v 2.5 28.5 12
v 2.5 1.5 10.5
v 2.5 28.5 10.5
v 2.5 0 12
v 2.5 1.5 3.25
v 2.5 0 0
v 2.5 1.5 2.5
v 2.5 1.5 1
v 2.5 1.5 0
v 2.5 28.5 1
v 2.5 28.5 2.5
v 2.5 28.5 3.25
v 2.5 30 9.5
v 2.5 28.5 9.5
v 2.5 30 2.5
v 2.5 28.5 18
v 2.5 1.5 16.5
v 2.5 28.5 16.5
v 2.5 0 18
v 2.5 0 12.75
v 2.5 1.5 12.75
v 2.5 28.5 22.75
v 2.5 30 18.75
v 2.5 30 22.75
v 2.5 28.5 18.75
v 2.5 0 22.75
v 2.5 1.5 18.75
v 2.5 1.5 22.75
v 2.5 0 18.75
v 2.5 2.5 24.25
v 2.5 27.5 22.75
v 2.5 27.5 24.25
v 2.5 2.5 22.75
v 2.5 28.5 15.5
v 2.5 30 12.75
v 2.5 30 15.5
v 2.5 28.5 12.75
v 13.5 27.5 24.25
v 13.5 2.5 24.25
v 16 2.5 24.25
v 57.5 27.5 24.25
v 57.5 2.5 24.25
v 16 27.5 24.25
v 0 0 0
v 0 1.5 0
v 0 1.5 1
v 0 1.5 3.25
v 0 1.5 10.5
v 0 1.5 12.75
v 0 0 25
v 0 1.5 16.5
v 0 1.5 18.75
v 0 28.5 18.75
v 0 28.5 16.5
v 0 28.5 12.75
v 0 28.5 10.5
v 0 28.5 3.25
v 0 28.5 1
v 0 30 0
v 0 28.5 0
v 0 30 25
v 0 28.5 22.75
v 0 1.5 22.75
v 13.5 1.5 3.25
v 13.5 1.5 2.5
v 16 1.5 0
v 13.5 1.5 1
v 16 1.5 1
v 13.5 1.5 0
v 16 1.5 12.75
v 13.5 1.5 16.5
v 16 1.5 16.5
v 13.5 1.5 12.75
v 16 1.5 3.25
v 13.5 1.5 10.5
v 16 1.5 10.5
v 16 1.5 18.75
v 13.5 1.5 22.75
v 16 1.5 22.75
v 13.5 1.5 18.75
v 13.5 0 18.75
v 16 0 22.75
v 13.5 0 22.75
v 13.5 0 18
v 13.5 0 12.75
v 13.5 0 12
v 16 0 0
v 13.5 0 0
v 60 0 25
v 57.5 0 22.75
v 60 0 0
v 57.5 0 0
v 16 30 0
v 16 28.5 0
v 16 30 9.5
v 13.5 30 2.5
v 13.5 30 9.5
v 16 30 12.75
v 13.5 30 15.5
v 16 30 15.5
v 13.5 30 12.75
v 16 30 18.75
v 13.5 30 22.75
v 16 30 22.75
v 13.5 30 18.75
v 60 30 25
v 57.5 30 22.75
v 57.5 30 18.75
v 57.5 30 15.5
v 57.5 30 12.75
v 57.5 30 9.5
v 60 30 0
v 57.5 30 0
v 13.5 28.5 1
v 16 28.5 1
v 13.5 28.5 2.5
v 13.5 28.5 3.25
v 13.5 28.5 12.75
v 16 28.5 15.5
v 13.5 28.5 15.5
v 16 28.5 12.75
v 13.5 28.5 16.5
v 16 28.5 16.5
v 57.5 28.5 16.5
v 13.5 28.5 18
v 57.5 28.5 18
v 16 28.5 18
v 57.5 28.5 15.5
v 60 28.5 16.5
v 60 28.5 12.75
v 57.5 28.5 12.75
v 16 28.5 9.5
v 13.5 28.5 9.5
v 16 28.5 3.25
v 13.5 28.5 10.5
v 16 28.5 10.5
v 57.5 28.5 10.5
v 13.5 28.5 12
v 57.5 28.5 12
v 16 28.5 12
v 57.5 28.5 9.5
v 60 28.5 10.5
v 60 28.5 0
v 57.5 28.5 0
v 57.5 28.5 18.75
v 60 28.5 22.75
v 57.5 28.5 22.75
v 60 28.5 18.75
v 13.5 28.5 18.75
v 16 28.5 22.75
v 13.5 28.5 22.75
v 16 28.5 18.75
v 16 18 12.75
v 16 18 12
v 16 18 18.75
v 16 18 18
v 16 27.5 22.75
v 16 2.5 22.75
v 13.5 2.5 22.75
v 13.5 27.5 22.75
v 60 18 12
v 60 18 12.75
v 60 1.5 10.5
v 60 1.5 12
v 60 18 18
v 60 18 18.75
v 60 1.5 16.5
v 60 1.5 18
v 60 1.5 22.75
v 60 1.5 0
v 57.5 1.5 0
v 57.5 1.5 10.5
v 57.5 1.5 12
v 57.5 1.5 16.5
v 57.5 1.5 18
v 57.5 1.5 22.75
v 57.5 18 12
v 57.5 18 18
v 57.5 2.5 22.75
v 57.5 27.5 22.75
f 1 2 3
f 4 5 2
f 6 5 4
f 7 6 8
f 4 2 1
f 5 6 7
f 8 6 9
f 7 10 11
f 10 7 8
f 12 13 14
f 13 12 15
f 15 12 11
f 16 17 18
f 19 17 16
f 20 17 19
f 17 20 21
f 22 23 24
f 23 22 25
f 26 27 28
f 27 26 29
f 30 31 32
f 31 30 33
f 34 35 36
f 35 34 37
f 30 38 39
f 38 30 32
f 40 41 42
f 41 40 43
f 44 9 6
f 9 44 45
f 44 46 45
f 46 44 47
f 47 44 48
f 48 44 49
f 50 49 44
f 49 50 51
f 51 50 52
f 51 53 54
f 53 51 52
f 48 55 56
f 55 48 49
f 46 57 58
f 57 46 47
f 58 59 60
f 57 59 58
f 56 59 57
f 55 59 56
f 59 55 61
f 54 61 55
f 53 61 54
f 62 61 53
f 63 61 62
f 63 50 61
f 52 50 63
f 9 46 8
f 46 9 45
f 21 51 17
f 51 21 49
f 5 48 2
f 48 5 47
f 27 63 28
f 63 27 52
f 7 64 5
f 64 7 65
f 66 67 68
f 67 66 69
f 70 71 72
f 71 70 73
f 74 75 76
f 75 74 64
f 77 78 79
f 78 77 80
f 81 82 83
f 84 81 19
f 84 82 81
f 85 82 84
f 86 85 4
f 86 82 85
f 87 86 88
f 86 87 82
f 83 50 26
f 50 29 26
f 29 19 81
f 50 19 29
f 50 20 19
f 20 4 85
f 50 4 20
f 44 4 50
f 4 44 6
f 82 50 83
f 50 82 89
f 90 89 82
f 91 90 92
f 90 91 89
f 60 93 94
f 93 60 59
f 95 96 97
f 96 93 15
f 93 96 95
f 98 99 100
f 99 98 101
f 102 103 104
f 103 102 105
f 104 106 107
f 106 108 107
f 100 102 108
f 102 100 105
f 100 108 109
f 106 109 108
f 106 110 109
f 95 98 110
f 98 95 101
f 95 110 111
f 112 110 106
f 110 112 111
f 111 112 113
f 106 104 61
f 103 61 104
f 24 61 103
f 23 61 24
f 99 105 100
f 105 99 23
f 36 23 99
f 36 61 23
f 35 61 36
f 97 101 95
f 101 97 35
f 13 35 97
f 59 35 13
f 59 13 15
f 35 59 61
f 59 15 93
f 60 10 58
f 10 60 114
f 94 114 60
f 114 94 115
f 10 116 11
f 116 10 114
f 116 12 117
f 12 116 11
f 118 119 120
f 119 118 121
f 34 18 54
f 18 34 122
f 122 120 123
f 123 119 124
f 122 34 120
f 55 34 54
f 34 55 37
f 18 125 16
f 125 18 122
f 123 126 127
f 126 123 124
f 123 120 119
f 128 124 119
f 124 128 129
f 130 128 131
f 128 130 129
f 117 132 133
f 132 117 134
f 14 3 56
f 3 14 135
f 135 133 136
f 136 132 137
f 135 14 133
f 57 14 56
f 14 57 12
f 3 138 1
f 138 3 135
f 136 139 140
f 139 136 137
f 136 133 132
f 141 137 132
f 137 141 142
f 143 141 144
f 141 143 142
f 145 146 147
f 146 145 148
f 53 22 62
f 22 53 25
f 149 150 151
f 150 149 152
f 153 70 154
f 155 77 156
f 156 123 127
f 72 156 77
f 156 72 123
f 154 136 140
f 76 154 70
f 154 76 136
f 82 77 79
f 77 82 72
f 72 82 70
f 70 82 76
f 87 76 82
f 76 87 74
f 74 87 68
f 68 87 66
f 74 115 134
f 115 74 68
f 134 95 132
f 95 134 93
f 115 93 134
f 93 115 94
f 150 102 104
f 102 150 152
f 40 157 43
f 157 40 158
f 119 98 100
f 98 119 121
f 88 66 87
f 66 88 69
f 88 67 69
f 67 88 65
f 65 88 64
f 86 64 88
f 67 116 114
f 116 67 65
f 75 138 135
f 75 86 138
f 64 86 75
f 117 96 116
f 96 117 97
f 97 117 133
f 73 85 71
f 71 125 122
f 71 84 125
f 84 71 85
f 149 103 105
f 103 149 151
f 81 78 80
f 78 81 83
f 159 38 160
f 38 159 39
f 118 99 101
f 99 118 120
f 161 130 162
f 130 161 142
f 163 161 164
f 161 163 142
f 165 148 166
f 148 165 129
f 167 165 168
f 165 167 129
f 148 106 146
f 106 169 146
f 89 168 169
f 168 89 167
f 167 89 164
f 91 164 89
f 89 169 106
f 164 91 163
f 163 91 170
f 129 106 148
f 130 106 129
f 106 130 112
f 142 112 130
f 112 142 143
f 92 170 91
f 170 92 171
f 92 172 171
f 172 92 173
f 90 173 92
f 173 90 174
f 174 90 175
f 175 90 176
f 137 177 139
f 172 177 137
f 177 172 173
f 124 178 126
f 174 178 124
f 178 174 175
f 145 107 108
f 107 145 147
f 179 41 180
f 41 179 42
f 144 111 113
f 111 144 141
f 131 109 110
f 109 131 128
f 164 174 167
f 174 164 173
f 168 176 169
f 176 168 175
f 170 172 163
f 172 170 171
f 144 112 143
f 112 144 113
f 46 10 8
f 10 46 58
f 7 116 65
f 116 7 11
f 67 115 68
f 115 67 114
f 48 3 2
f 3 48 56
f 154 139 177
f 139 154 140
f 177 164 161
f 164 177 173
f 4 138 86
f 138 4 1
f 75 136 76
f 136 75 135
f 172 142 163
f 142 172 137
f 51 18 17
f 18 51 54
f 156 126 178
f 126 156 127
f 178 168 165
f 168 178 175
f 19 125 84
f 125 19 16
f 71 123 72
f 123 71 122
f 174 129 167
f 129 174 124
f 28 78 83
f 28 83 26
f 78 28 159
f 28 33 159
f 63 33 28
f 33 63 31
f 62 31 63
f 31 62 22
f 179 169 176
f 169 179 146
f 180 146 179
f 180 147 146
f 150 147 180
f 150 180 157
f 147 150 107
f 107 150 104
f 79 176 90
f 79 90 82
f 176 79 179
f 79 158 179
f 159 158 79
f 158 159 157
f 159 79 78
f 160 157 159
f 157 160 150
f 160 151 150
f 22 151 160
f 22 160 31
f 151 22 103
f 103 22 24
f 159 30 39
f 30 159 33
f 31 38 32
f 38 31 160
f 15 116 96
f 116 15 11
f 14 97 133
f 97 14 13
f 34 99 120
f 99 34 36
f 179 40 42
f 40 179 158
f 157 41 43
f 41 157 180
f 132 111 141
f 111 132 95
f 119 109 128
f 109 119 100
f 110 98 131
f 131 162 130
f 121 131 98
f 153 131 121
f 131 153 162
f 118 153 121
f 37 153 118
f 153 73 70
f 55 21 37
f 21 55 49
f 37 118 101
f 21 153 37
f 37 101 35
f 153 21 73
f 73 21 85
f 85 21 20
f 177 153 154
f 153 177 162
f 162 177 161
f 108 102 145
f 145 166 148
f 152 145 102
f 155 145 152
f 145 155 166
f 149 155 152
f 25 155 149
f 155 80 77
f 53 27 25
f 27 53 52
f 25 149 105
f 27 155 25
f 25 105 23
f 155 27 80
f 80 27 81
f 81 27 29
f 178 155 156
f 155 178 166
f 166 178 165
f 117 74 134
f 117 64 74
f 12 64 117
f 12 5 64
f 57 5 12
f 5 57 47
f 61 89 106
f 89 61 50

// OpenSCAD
// -*- mode: scad; orgstruct-heading-prefix-regexp: "// " -*-
// * Variables
table = [60, 30, 25];
stud = [2.5,1.5];
plywood_thickness = .75;
shelf = [11+stud.x, 12, [max(stud.y, stud.x), 12, 18]];
turquoise = [5/16,14/16,14/16];
blonde = [15.1/16, 13.25/16, 9.25/16];
mustard = [15.1/16, 13/16, 3/16];
module make_stud(length) { echo(length);cube([stud.x, stud.y, length]); }
module platform(x, y) { color(blonde) cube([x, y, plywood_thickness]); }

color(turquoise)
// * The 6 legs
for (x = [0, shelf.x, table.x - stud.x]) {
     for (y = [0, table.y - stud.y]) {
          translate([x,y,0])
               make_stud(table.z - plywood_thickness);
     }
}

color(turquoise)
// * Cross ties between the legs
for (z = concat(shelf.z, table.z - plywood_thickness)) {
     for (x = [0, shelf.x, table.x - stud.x]) {
          if (x != table.x - stud.x || z != shelf.z[0])
              translate([x, stud.y, z])
                  rotate([-90, 0, 0])
                  make_stud(table.y - stud.y * 2);
     }
}

//color(turquoise)
// * Cross ties spanning the legs
for (i = [0,1]) {
     x = [stud.x, shelf.x+stud.x][i];
     l = [shelf.x - stud.x, table.x - shelf.x - stud.x*2][i];

     for (y = [0, table.y - stud.x]) {
         translate([x,y, table.z - plywood_thickness - stud.y])
             rotate([90,0,90])
             make_stud(l);
     }

     // Back studs
     for (z = shelf.z) {
          if (i != 1 || z != shelf.z[0])
              translate([x,table.y - stud.y,z])
                  rotate([0,90,0])
                  make_stud(l);
     }
}

// * Tabletop
translate([0,0,table.z - plywood_thickness])
platform(table.x, table.y);

// * module shelf
module shelf(z) {
     translate([0,0,z]) {
          //shelf
          translate([0,stud.y,0])
               platform(shelf.x + stud.x, table.y - stud.y*2);
         if (z != shelf.z[0]) {
             //backshelf
                 translate([shelf.x + stud.x, table.y - shelf.y , 0])
                 platform(table.x - shelf.x - stud.x, shelf.y - stud.y);
             union(){
                 //front bit
                 translate([stud.x, 0,0])
                     platform(shelf.x-stud.x, stud.y);
                 //back shelf bit
                 translate([stud.x, table.y - stud.y, 0])
                     platform(shelf.x - stud.x, stud.y);
                 // skinny back shelf bit
                 translate([shelf.x + stud.x, table.y - stud.y, 0])
                     platform(table.x - shelf.x - stud.x * 2, stud.y);
             }
         }
     }
}

// * Shelves
for (z = shelf.z) { shelf(z); }

* union() {
     %platform(96,48);
     shelf(0);
     translate([table.x + shelf.x + stud.x + 1, table.y,0])
     rotate(180)
     shelf(0);
}
//!shelf(0);
